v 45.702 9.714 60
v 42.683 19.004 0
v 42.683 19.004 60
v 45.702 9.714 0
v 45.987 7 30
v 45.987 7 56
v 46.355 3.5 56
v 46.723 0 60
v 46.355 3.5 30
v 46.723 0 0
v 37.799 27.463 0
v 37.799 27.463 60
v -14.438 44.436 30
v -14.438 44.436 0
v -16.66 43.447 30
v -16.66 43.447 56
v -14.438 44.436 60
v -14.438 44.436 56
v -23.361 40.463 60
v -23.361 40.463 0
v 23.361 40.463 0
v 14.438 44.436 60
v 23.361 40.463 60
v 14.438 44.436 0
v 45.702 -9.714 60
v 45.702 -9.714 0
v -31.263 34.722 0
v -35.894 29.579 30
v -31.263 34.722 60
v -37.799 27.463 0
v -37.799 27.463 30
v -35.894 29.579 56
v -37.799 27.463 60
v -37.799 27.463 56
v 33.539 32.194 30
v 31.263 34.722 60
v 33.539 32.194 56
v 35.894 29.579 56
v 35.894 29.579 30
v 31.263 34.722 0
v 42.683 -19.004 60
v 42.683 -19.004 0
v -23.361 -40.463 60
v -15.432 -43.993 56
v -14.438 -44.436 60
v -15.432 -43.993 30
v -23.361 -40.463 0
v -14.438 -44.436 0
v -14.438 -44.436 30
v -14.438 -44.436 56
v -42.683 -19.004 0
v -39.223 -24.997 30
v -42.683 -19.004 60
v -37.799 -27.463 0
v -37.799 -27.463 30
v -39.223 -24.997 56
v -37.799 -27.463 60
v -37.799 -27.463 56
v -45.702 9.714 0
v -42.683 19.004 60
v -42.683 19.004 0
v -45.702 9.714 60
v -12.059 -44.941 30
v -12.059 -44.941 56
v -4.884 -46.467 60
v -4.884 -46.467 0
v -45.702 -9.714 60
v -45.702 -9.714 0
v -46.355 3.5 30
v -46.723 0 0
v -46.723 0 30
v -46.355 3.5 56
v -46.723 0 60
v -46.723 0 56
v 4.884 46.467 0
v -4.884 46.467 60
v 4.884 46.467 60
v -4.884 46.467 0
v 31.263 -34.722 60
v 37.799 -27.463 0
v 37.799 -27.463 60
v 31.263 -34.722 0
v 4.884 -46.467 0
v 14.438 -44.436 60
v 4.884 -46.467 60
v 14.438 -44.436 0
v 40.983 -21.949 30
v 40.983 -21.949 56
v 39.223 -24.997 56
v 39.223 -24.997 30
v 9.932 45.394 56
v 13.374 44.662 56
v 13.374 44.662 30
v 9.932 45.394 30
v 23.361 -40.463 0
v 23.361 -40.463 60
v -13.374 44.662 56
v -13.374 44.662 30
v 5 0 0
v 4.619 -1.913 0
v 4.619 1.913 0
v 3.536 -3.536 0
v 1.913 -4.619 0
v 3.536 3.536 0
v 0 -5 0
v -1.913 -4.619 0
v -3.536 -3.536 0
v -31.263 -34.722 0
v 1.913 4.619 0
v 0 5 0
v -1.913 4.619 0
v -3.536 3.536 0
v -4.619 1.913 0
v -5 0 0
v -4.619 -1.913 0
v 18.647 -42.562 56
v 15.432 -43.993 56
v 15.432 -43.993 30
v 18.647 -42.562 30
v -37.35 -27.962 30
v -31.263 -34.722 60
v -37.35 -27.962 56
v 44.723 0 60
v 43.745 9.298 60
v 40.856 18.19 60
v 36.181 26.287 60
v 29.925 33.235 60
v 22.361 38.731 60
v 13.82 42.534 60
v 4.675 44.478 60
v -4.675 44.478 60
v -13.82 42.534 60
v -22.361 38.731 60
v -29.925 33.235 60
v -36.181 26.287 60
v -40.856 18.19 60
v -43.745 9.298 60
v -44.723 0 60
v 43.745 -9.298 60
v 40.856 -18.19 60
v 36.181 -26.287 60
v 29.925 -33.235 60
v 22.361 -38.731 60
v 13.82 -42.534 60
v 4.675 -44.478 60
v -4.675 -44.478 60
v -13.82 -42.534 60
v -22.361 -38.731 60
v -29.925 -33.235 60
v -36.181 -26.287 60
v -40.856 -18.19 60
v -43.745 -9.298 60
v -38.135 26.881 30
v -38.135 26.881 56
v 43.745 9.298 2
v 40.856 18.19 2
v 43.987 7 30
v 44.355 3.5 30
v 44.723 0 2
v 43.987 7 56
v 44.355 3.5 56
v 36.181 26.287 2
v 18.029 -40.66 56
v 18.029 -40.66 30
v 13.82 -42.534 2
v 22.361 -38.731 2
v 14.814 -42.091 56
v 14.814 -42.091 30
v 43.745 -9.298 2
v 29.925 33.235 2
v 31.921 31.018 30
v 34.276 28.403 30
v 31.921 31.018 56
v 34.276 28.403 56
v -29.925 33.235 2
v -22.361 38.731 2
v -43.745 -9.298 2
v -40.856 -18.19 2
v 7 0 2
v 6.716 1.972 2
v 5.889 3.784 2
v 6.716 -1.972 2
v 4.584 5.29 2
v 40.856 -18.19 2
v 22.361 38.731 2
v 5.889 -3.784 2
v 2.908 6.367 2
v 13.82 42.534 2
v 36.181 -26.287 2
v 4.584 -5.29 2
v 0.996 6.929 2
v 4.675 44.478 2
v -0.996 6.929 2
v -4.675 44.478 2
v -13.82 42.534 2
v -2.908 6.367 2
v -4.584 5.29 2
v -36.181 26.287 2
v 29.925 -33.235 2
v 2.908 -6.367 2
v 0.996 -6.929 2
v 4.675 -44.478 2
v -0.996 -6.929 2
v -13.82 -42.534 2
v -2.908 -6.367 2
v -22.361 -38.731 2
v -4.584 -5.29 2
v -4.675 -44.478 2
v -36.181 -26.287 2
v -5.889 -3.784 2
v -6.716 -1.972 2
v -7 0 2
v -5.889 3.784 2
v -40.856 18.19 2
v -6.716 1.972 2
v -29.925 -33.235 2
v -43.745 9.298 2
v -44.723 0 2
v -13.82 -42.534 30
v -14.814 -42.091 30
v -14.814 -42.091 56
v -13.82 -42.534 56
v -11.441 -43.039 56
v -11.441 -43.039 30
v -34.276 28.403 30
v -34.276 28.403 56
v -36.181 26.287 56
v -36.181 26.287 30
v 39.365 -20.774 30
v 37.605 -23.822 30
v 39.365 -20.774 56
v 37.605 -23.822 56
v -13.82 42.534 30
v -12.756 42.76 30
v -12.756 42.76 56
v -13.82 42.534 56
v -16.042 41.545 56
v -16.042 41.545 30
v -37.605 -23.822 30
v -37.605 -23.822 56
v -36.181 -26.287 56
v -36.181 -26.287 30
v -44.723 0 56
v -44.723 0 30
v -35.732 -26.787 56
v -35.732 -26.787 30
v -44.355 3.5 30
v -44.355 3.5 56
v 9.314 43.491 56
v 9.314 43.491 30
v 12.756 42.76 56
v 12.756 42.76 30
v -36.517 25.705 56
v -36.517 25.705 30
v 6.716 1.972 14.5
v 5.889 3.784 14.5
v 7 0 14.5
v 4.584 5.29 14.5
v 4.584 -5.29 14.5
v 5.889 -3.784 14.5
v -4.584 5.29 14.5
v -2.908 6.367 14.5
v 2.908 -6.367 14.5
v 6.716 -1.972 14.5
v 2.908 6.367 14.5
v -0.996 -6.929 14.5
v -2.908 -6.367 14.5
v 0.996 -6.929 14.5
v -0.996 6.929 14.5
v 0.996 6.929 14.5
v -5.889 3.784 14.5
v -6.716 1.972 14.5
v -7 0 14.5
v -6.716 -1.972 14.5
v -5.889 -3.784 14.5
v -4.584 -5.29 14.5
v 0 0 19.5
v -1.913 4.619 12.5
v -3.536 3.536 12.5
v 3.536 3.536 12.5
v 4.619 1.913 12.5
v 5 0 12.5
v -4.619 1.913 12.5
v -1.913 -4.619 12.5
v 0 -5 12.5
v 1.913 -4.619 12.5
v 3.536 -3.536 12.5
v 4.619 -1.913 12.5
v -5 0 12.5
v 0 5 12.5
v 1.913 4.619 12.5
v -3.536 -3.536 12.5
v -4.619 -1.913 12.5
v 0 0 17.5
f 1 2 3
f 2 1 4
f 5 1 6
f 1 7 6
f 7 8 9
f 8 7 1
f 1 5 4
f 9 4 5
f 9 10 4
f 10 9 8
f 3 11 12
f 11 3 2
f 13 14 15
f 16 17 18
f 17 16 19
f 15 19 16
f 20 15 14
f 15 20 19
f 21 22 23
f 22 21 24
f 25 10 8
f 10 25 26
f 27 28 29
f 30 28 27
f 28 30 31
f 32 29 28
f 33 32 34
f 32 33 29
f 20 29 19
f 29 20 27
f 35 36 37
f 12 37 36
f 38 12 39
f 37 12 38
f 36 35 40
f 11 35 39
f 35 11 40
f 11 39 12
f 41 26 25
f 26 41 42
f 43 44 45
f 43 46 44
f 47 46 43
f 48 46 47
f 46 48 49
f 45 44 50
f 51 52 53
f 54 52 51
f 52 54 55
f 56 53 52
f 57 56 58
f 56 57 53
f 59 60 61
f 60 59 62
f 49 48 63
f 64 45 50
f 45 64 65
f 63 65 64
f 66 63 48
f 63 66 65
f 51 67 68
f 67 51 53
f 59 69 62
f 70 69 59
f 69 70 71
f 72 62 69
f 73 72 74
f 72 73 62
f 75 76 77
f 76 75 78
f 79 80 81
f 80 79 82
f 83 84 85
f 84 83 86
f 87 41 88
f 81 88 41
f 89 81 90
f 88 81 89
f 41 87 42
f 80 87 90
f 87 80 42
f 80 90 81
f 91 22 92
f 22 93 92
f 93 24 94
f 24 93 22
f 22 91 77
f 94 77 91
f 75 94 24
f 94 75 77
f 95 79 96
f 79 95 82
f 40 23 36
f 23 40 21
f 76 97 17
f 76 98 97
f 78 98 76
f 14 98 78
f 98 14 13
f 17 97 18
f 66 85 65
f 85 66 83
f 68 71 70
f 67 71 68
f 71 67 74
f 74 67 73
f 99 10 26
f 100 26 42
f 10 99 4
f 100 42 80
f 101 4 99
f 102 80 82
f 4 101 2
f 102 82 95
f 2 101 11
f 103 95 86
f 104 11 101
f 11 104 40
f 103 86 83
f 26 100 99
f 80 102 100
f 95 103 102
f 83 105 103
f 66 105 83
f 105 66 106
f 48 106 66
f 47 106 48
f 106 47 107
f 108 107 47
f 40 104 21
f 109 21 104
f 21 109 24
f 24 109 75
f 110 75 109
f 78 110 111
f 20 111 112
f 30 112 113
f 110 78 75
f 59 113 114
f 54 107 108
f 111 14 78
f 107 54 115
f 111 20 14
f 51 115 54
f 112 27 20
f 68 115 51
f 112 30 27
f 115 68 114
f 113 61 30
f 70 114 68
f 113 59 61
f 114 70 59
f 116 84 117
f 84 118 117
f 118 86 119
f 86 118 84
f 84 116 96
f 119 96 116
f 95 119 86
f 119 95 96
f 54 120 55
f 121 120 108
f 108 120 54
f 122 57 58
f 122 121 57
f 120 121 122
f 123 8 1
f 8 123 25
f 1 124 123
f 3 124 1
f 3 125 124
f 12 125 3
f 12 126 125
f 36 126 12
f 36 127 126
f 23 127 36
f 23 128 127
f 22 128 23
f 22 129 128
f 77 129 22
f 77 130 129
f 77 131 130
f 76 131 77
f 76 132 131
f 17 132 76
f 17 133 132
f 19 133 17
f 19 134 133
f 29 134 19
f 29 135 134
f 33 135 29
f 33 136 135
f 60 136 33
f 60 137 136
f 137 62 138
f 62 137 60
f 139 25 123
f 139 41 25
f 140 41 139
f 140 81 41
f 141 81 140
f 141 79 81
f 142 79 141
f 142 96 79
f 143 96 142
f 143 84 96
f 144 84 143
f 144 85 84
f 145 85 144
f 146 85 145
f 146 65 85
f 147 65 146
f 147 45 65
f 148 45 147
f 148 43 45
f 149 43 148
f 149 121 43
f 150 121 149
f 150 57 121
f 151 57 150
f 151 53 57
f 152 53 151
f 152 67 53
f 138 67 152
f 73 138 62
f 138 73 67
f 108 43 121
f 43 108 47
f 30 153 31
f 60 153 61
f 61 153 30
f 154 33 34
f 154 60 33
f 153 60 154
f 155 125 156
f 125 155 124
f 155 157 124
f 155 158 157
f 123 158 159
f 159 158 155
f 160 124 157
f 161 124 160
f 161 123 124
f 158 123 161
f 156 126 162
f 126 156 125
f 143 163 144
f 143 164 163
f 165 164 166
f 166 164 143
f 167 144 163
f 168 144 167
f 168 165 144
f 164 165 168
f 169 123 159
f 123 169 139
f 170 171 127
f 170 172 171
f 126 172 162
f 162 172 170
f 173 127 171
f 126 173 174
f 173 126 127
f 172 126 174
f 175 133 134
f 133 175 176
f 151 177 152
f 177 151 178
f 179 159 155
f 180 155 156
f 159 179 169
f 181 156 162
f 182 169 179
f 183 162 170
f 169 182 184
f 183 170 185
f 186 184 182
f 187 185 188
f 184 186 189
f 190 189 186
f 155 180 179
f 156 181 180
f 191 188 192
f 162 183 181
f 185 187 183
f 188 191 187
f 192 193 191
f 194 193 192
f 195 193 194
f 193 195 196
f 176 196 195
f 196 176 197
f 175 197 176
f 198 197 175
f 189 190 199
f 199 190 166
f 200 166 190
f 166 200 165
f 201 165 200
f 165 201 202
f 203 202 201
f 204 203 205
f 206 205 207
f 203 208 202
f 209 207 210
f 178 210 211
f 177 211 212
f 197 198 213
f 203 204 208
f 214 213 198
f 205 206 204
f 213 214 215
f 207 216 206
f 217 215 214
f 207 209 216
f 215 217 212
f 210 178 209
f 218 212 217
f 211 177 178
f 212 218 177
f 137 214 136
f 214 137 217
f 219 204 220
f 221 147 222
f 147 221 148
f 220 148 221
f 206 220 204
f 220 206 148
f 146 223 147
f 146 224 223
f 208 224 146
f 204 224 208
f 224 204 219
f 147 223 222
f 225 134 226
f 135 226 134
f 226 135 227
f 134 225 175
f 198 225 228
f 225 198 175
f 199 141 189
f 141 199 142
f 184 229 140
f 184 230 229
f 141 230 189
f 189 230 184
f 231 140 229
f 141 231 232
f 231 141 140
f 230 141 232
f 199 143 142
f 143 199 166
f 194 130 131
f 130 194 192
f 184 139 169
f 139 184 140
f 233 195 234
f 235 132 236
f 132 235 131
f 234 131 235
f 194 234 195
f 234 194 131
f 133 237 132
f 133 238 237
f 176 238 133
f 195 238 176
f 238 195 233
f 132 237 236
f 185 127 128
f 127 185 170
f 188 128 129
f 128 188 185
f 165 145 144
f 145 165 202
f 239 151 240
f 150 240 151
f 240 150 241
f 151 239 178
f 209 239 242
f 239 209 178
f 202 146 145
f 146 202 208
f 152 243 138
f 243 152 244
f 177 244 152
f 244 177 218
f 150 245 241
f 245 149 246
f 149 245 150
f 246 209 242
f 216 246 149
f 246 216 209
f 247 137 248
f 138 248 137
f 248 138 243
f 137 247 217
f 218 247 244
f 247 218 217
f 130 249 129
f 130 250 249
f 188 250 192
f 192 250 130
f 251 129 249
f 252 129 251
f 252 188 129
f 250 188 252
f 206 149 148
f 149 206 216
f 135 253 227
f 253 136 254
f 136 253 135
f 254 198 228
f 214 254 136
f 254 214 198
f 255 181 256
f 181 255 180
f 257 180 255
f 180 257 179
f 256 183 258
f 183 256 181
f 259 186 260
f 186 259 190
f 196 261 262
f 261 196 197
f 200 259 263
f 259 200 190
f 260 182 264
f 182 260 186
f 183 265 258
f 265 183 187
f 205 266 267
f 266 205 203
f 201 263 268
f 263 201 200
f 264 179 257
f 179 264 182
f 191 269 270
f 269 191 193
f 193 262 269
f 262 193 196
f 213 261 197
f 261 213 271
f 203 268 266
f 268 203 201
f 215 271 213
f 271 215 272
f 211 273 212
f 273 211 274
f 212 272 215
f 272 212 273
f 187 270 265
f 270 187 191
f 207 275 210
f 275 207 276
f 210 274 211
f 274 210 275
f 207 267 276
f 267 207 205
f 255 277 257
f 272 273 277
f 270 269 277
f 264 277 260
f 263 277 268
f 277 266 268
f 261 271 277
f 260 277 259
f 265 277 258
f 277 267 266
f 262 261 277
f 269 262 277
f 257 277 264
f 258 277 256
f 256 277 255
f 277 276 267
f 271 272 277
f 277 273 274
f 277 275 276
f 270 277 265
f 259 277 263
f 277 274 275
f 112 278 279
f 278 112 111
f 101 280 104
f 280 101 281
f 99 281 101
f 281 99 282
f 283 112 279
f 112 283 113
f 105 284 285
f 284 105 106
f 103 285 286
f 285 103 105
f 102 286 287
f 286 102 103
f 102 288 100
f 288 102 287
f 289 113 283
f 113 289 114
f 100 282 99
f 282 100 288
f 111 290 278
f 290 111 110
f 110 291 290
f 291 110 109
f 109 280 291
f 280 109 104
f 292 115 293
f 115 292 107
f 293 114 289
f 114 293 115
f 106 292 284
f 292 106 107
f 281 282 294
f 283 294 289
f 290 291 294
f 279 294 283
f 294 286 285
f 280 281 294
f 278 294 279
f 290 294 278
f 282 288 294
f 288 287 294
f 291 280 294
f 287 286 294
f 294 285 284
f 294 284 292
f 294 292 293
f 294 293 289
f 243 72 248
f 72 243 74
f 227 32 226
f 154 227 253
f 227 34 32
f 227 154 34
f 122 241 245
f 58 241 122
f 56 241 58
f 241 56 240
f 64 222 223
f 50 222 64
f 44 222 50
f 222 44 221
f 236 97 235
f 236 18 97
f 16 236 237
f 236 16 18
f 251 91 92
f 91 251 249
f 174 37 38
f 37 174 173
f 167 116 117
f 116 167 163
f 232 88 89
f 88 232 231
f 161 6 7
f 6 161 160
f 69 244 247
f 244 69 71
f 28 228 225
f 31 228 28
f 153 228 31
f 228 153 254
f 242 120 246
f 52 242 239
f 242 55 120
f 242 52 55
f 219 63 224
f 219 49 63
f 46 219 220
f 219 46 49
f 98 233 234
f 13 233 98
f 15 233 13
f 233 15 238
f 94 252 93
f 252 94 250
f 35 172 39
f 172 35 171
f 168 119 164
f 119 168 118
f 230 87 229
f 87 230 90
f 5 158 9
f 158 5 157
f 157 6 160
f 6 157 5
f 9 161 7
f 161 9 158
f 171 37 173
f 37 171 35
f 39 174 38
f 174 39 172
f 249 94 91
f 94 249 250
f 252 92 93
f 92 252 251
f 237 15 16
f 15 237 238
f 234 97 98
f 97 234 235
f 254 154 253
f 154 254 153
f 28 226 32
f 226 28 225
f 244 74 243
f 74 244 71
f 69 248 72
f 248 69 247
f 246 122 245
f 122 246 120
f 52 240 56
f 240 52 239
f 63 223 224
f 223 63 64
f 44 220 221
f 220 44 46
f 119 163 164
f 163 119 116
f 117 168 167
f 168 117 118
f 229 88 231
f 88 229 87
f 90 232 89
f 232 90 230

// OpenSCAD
// Zoetrope animation device by Michael S. Scherotter

// picture strip length in mm
pictureStripLength = 281; //[250:431]

// picture strip height in mm
pictureHeight = 30; // [10:100]

// number of slits
slitCount = 10; // [6:20]

// slit width in mm
slitWidth = 7; // [2:10]

// ignore
coneHeight = 5;

createZoetrope();

module hub(hubHeight)
{
	union()
	{
		cylinder(h= hubHeight - coneHeight, r= 7);
		translate([0,0,hubHeight - coneHeight])
		{
			cylinder(r1=7, r2=0, h=5);
		};
	}
}

module insideHub(pictureHeight) {
    height = pictureHeight - 2;
    innerConeHeight = coneHeight - 1;

    union()
	{
		cylinder(r= 5, h= height - coneHeight);
		translate([0,0,height-coneHeight])
		{
			cylinder(r1= 5, r2= 0, h= coneHeight);
		};
	}
}

module slits(outerRadius, pictureHeight, slitHeight, slitWidth, slitCount) 
{
    arc = 360 / slitCount;
	translate([0,0,pictureHeight])
	{
		union()
		{
			for (a=[0:arc:360])
			{
				translate([0, slitWidth / 2, 0])
				{
					rotate([0,0,a])
					{
						cube([outerRadius * 2, slitWidth / 2, slitHeight]);
					}
				}
			}
		}
	}
}


module createZoetrope () {
	innerRadius = pictureStripLength / (2 * 3.1415927);
    outerRadius = innerRadius + 2;
    slitHeight = pictureHeight;
    hubHeight = pictureHeight *0.65;

    totalHeight = pictureHeight + slitHeight;

	difference()
	{
		union()	
		{
			difference()
			{
				cylinder(r= outerRadius, h= totalHeight );
				translate([0,0,2]){
					cylinder(r= innerRadius, h= totalHeight );
				};
			};
			hub(hubHeight);
		};
		insideHub(hubHeight);
		slits(outerRadius, pictureHeight, slitHeight - 4, slitWidth, slitCount);
	}
}
